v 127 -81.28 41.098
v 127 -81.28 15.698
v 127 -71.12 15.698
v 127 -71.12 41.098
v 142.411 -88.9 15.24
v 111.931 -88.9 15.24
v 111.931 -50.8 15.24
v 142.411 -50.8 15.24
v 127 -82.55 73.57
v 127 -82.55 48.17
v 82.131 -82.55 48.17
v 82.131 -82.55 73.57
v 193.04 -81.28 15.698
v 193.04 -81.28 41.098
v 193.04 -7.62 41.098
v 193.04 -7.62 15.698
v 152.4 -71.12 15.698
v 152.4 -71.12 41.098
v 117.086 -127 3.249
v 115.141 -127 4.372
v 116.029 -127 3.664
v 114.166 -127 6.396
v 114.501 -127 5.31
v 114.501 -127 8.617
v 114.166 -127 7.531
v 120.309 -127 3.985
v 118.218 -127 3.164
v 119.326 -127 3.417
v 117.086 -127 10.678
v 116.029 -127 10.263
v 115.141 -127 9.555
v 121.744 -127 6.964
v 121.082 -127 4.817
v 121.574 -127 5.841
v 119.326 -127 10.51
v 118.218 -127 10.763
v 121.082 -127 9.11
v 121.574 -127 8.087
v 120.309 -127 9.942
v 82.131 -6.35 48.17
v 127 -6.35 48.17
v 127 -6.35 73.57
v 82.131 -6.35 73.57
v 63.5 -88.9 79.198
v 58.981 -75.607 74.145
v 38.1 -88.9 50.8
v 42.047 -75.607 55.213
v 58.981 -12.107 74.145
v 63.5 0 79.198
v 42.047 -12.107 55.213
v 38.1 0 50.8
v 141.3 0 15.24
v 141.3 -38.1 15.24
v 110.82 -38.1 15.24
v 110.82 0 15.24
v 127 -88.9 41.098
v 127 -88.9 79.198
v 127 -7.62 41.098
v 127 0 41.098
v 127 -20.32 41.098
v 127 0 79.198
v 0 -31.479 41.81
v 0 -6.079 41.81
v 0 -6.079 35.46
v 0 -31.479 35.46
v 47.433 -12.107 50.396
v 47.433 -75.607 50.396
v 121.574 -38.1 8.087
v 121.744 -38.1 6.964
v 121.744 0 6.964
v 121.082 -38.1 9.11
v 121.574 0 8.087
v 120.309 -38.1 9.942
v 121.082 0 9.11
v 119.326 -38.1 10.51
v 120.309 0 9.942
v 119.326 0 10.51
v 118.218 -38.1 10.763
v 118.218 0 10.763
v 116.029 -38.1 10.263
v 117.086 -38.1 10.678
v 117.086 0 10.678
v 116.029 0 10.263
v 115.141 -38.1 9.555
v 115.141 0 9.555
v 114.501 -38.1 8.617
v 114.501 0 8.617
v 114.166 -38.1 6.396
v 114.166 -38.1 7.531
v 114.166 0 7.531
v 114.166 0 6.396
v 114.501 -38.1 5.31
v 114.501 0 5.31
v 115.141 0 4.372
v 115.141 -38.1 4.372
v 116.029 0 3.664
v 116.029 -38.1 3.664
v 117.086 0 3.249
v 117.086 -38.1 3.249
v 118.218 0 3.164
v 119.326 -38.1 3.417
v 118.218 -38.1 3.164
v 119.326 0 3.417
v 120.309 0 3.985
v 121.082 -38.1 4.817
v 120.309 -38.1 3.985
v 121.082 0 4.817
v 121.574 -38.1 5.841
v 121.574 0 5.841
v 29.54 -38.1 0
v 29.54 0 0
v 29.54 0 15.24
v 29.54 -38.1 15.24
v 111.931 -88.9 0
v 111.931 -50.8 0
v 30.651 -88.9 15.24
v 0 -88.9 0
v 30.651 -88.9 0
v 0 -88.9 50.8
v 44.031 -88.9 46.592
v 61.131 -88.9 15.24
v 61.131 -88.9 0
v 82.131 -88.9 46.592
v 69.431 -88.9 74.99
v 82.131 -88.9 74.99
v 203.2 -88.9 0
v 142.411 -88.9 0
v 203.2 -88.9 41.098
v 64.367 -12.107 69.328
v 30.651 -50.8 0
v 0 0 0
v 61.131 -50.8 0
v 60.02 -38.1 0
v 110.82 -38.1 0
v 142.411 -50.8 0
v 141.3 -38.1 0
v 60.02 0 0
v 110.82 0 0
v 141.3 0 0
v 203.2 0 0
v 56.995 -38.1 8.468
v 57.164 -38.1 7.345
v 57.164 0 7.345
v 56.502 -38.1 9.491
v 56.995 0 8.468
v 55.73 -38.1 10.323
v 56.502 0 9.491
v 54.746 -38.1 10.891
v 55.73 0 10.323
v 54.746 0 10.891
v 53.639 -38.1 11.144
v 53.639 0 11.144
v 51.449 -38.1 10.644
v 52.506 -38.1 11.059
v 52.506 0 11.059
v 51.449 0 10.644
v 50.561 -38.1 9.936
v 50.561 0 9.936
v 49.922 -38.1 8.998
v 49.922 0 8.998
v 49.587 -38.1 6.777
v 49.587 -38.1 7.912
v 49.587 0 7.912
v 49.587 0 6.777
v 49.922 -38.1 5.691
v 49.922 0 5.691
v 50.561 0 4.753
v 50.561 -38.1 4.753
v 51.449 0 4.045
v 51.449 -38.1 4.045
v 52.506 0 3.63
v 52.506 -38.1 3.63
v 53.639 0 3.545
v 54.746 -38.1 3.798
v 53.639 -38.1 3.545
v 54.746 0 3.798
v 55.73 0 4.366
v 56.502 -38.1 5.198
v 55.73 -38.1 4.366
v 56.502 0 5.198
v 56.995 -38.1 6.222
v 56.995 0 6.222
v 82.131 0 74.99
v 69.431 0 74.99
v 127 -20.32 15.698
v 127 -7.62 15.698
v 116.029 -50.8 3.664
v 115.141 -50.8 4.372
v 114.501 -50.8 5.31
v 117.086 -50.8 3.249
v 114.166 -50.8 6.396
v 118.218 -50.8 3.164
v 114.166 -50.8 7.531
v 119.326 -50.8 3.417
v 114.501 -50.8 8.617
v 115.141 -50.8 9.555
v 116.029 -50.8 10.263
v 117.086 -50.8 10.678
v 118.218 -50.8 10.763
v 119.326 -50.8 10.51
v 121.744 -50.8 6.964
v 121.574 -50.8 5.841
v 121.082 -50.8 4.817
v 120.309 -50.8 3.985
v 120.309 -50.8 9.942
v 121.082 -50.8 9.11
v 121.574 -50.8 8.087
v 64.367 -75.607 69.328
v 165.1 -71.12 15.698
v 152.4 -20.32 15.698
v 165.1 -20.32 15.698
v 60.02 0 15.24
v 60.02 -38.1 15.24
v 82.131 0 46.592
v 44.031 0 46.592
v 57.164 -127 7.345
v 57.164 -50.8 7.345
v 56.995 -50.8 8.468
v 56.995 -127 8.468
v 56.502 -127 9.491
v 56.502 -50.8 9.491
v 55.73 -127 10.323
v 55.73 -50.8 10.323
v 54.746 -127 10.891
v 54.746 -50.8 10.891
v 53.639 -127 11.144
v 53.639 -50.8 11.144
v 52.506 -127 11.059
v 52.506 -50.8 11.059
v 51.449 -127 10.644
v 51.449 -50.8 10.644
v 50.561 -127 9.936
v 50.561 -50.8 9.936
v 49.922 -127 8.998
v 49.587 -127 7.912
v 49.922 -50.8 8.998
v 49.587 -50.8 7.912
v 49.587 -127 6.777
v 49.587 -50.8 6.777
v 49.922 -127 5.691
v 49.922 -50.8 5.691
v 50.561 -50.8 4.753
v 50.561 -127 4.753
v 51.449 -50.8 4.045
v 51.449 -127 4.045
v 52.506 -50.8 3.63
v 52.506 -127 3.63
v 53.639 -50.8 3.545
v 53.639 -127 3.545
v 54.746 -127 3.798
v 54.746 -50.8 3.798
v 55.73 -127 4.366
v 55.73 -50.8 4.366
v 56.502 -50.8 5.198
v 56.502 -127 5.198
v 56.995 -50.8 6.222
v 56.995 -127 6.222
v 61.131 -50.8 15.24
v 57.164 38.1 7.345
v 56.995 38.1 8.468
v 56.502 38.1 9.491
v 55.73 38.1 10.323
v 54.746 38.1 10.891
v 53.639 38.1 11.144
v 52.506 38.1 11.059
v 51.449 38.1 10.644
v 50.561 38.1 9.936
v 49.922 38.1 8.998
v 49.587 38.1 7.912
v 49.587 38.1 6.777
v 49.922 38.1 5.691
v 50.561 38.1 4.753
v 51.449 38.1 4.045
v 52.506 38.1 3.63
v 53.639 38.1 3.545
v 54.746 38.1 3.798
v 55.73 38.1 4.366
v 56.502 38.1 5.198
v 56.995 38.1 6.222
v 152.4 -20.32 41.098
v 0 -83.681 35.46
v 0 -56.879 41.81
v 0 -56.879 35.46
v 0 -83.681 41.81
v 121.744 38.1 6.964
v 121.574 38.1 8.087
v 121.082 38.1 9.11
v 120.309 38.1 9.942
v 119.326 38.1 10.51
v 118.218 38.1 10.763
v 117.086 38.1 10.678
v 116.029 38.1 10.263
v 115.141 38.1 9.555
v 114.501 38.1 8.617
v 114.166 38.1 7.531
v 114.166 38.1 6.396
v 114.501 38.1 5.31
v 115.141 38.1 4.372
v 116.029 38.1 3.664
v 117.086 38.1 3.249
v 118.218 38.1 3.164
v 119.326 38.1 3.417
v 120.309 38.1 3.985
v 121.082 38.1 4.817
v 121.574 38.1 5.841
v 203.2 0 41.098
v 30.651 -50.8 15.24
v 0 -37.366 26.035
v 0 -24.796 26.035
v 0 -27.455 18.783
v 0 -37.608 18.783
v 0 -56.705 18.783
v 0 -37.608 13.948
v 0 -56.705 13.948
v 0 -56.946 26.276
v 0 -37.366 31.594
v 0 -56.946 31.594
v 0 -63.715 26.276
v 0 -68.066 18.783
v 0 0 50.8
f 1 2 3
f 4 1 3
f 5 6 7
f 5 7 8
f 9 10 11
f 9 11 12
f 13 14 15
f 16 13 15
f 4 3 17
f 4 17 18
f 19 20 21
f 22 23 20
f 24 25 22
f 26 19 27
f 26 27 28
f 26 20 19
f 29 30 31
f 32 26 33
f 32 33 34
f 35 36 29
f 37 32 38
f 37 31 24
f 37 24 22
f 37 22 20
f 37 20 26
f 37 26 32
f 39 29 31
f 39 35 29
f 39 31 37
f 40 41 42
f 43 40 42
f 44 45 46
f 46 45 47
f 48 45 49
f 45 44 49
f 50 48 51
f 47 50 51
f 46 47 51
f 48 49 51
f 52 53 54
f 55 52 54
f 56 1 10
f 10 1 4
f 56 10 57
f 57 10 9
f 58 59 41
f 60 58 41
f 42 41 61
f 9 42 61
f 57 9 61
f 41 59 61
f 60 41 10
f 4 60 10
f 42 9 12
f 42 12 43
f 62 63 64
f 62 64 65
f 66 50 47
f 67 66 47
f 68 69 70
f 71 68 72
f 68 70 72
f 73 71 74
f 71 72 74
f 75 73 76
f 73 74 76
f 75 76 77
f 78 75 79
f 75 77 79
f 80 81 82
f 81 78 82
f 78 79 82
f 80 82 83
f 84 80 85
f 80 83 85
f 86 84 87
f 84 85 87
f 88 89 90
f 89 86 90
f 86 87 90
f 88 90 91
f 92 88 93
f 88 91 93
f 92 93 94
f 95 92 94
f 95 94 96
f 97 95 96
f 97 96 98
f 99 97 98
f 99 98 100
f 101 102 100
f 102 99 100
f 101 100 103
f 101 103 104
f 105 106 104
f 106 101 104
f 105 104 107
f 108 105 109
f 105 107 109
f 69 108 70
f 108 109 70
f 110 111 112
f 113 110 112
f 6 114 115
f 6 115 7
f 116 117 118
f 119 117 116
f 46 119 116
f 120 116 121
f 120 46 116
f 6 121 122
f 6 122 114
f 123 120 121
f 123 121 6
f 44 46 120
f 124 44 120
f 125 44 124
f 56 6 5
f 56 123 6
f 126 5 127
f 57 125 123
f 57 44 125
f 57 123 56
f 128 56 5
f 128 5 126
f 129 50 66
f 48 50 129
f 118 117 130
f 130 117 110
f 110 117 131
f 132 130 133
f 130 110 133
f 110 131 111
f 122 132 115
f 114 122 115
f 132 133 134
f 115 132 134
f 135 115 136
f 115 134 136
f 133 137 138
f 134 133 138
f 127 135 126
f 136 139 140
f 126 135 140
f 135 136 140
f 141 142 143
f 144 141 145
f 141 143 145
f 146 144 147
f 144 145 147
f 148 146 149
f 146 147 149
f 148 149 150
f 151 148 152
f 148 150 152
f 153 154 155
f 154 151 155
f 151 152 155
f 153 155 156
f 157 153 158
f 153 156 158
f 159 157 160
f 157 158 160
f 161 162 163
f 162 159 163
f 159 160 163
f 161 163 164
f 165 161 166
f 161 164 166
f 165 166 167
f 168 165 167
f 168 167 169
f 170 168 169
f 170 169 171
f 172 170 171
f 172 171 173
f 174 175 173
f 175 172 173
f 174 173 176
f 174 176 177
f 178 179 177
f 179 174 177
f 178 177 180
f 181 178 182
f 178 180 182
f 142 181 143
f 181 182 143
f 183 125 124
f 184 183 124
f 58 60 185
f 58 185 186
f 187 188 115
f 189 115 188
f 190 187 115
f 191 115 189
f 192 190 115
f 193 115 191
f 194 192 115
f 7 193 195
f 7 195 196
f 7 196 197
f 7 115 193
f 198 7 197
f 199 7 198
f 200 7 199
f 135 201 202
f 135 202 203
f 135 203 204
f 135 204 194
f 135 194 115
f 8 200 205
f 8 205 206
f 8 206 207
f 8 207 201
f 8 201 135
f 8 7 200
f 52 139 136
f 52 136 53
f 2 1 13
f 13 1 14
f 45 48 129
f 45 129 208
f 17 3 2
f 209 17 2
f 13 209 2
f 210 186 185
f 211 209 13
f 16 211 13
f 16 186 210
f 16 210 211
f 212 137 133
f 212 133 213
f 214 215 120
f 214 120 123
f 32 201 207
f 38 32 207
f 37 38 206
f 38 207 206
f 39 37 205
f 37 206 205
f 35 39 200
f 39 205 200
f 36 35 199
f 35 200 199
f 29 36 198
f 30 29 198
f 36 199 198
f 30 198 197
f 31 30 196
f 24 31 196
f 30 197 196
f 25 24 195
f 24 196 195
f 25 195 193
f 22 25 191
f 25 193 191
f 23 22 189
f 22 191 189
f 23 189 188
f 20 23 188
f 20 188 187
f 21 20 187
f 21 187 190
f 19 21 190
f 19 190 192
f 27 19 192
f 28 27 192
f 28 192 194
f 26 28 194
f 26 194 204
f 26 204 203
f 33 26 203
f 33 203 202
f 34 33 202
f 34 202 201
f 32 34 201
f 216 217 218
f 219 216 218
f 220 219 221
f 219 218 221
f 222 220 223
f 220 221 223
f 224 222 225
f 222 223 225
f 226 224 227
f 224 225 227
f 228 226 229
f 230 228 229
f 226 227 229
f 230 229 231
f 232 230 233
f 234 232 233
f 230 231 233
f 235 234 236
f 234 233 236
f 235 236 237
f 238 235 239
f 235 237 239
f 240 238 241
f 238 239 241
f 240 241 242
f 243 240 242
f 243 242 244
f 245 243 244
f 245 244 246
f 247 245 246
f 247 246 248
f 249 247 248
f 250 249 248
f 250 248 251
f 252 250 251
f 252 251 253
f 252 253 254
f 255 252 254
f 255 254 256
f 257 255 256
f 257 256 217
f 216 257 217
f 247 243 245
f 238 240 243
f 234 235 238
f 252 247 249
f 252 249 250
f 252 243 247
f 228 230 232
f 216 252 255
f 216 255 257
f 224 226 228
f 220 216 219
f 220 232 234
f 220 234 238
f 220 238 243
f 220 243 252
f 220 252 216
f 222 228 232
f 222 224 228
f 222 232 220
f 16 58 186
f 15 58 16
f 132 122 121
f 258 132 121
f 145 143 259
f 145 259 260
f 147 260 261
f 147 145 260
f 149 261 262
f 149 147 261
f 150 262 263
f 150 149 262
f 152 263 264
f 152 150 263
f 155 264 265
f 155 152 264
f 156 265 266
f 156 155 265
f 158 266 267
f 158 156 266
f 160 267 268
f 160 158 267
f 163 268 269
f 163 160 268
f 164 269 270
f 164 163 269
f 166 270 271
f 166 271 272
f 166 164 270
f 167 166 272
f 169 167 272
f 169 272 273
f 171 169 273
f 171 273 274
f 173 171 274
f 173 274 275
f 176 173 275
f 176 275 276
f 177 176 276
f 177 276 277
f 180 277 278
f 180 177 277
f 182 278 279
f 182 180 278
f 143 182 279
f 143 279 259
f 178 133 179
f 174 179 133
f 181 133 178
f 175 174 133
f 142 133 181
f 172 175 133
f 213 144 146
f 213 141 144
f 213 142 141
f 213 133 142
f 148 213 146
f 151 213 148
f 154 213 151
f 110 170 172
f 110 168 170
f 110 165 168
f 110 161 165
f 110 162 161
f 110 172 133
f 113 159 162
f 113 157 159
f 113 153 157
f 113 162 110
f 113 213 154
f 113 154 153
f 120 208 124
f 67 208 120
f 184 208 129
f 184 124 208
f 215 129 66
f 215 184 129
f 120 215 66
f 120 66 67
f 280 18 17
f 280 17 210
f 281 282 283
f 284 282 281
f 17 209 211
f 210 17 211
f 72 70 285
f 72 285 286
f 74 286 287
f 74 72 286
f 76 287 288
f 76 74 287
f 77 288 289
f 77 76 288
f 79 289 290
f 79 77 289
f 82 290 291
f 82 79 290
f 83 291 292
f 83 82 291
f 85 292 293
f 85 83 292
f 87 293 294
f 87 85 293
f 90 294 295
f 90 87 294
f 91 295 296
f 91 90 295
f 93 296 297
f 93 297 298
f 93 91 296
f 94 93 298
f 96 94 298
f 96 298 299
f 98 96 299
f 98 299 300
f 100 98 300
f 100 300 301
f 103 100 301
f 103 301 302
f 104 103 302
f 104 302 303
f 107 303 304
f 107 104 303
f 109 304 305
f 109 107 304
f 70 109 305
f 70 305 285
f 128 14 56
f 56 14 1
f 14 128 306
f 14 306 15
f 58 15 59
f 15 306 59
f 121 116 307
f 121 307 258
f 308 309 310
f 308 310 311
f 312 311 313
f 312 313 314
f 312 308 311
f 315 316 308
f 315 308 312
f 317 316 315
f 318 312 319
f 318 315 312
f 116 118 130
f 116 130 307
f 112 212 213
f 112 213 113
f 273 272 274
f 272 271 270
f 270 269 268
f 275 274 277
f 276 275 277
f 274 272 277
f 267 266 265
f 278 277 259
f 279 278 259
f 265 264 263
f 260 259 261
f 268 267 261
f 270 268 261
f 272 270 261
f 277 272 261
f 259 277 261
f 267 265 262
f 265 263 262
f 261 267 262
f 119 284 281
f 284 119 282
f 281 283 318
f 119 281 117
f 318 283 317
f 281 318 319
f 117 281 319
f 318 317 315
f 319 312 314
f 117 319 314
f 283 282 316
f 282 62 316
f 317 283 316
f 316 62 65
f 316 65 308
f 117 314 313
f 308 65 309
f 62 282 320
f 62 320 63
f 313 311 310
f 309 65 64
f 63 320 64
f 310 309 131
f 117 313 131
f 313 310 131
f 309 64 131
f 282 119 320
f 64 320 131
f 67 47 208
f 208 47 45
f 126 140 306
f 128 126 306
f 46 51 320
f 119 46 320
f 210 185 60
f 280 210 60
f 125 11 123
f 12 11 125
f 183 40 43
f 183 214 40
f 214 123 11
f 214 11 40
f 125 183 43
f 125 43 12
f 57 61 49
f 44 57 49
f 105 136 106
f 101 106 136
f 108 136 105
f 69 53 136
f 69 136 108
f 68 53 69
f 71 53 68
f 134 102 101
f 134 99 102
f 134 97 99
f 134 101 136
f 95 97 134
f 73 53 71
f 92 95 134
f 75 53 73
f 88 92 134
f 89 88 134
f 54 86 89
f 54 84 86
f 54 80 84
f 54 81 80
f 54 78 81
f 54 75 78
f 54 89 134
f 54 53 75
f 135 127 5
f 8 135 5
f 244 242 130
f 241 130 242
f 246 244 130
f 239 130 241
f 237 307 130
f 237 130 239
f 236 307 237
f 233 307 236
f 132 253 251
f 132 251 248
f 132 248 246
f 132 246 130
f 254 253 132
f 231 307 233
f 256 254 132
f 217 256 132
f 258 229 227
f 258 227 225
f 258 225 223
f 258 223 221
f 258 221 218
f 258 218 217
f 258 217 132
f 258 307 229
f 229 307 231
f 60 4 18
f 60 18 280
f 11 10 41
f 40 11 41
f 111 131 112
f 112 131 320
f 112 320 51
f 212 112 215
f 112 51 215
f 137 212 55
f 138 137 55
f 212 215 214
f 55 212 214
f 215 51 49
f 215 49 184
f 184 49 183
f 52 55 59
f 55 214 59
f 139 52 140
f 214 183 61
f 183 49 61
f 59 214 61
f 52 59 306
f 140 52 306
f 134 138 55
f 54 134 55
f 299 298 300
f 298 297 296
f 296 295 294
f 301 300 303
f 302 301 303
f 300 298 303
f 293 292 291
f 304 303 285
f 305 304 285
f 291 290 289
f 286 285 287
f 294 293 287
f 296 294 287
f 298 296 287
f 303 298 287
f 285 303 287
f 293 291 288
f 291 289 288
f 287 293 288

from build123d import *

# Parameters (mm, degrees)
F0_W          = 30.48
F0_H          = 15.24
F1_DEPTH      = 88.9
F2_W          = 30.48
F2_H          = 15.24
F3_DEPTH      = 38.1
F4_W          = 30.48
F4_H          = 15.24
F5_DEPTH      = 38.1
F6_R          = 3.81
F7_DEPTH      = 127
F7_DEPTH_BACK = 38.1
F9_DEPTH      = 88.9
F10_W         = 66.04
F10_H         = 73.66
F11_DEPTH     = 25.4
F12_W         = 63.5
F12_H         = 25.4
F13_DEPTH     = 12.7
F15_W         = 76.2
F15_H         = 25.4
F16_DEPTH     = 50.8
F18_DEPTH     = 7.62
F19_W         = 26.801726786
F19_H         = 6.35
F14_W         = 25.4
F14_H         = 6.35
F20_DEPTH     = 12.7
F21_DEPTH     = 12.7
F22_W         = 50.8
F22_H         = 25.4
F23_DEPTH     = 38.1
F24_DEPTH     = 12.7


# Not quite as in the source:
# - a feature names something its author has since deleted; it is built from what else it names


with BuildPart() as f1:
    # F0 (on Front) → F1 (new body)
    with BuildSketch(Plane.XZ):
        Polygon((0, 50.8), (0, 0), (29.5417681336, 0), (29.5417681336, 15.24), (60.0217681336, 15.24), (60.0217681336, 0), (121.1203709245, 0), (121.1203709245, 15.24), (151.6003709245, 15.24), (151.6003709245, 0), (203.2, 0), (203.2, 41.0980633142), (127, 41.0980633142), (127, 79.1980633142), (63.5, 79.1980633142), (38.1, 50.8), align=None)
        with Locations((44.7817681336, 7.62)):
            Rectangle(F0_W, F0_H)
        with Locations((136.3603709245, 7.62)):
            Rectangle(F0_W, F0_H)
    extrude(amount=F1_DEPTH)

    # F2 (on face) → F3 (cut)
    with BuildSketch(Plane.XZ.offset(88.9)):
        with Locations((45.8910012597, 7.62)):
            Rectangle(F2_W, F2_H)
        with Locations((127.1710012597, 7.62)):
            Rectangle(F2_W, F2_H)
    extrude(amount=-F3_DEPTH, mode=Mode.SUBTRACT)

    # F4 (on face) → F5 (cut)
    with BuildSketch(Plane(origin=(0, 0, 0), x_dir=(-1, 0, 0), z_dir=(0, 1, 0))):
        with Locations((-126.0602, 7.62)):
            Rectangle(F4_W, F4_H)
        with Locations((-44.7802, 7.62)):
            Rectangle(F4_W, F4_H)
    extrude(amount=-F5_DEPTH, mode=Mode.SUBTRACT)

    # F6 (on Front) → F7 (join, two sides)
    with BuildSketch(Plane.XZ) as f7_sk:
        with Locations((53.3541933731, 7.3445781872)):
            Circle(F6_R)
        with Locations((117.9336786941, 6.9635785541)):
            Circle(F6_R)
    extrude(amount=F7_DEPTH)
    extrude(f7_sk.sketch, amount=-F7_DEPTH_BACK)

    # F8 (on Front) → F9 (cut)
    with BuildSketch(Plane.XZ):
        Polygon((69.4312418273, 74.989986462), (44.0312418273, 46.5919231478), (82.1312418273, 46.5919231478), (82.1312418273, 74.989986462), align=None)
    extrude(amount=F9_DEPTH, mode=Mode.SUBTRACT)

    # F10 (on face) → F11 (cut)
    with BuildSketch(Plane.XY.offset(41.0980633142)):
        with Locations((160.02, -44.45)):
            Rectangle(F10_W, F10_H)
    extrude(amount=-F11_DEPTH, mode=Mode.SUBTRACT)

    # F12 (on face) → F13 (cut)
    with BuildSketch(Plane(origin=(-4.0760562793, 0, 3.6457355683), x_dir=(0, -1, 0), z_dir=(-0.7453559925, 0, 0.6666666667))):
        with Locations((43.8565216027, 81.8850251743)):
            Rectangle(F12_W, F12_H)
    extrude(amount=-F13_DEPTH, mode=Mode.SUBTRACT)

    # F15 (on face) → F16 (cut)
    with BuildSketch(Plane.YZ.offset(127)):
        with Locations((-44.45, 60.8695521951)):
            Rectangle(F15_W, F15_H)
    extrude(amount=-F16_DEPTH, mode=Mode.SUBTRACT)

    # F17 (on face) → F18 (join)
    with BuildSketch(Plane(origin=(0, 0, 0), x_dir=(0, -1, 0), z_dir=(-1, 0, 0))):
        Polygon((56.9462627172, 26.2763872743), (56.9462627172, 31.5944552422), (37.3661071062, 31.5944552422), (37.3661071062, 26.0346587747), (24.7961338609, 26.0346587747), (27.4551659822, 18.7827479094), (37.6078411937, 18.7827479094), (37.6078411937, 13.9481425285), (56.7045323551, 13.9481425285), (56.7045323551, 18.7827479094), (68.0658593774, 18.7827479094), (63.7147128582, 26.2763872743), align=None)
    extrude(amount=-F18_DEPTH)

    # F19 (on face) + F14 (on face) → F20 (join)
    with BuildSketch(Plane(origin=(0, 0, 0), x_dir=(0, -1, 0), z_dir=(-1, 0, 0))):
        with Locations((70.2801537674, 38.6348730328)):
            Rectangle(F19_W, F19_H)
    with BuildSketch(Plane(origin=(0, 0, 0), x_dir=(0, -1, 0), z_dir=(-1, 0, 0))):
        with Locations((18.7792903744, 38.6348730328)):
            Rectangle(F14_W, F14_H)
    extrude(amount=F20_DEPTH)

    # F21 (cut): faces of the model
    f21_faces = [f1.faces().sort_by_distance(p)[0] for p in [
        (-12.7, -18.7792903744, 38.6348730328),
        (-12.7, -70.2801537674, 38.6348730328),
    ]]
    extrude(f21_faces, amount=-F21_DEPTH, mode=Mode.SUBTRACT)

    # F22 (on face) → F23 (join)
    with BuildSketch(Plane.YZ.offset(127)):
        with Locations((-45.72, 28.3980633142)):
            Rectangle(F22_W, F22_H)
    extrude(amount=F23_DEPTH)

    # F24 (cut): a face of the model
    f24_faces = [f1.faces().sort_by_distance(p)[0] for p in [
        (165.1, -45.72, 28.3980633142),
    ]]
    extrude(f24_faces, amount=-F24_DEPTH, mode=Mode.SUBTRACT)


solid = f1.part
